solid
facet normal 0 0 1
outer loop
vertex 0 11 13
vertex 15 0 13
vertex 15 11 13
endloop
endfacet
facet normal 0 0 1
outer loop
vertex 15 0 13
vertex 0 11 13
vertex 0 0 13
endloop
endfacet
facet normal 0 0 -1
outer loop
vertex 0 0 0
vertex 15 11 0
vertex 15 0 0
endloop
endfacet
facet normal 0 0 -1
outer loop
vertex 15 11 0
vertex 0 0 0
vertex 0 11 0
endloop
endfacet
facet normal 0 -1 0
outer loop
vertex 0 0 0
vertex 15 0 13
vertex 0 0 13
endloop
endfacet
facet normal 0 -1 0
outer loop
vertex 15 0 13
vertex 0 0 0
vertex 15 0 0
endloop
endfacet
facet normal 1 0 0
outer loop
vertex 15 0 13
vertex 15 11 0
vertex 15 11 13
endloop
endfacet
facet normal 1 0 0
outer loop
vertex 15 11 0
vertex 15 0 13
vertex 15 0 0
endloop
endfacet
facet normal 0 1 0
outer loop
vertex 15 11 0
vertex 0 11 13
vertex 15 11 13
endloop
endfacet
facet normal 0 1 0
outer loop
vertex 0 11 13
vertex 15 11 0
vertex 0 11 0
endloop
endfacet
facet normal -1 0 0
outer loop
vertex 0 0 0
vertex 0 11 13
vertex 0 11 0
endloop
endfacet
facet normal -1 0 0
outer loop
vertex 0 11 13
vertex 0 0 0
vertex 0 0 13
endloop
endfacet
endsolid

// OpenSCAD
// Generated by SolidPython 1.0.1 on 2020-07-29 00:46:55


cube(size = [15, 11, 13]);
/***********************************************
*********      SolidPython code:      **********
************************************************
 
# import packages: SolidPython
from solid import *
from solid.utils import *
from itertools import chain, combinations, permutations


class Resize:

    def __init__(self, scad_file):
        self.scad_file = scad_file
        #self.scad_file = import_scad(scad_file)
        # cone/cylinder param:
        self.r1 = 0
        self.r2 = 0
        self.h = 0
        # rectangular prism param:
        self.w = 0
        self.l = 0
        # ellipse param:
        self.r = 0

    # import OpenScad code (file name corresponds to shape)


    # classify shape + parameters
    def assign(self, param1, param2, param3):
        if self.scad_file == 'cone.scad':
            self.r1 = param1
            self.r2 = param2
            self.h = param3
        elif self.scad_file == 'cylinder.scad':
            self.r1 = param1
            self.r2 = param2
            self.h = param3
        elif self.scad_file == 'rectangularPrism.scad':
            self.h = param1
            self.l = param2
            self.w = param3
        else:
            self.r = param1
            self.h = param2

    # resize parameters
    def iterate(self):
        x = range(3, 20, 2)
        i = 1
        if self.scad_file == 'cone.scad':
            tempList = list(permutations(x, 2))
            for temp in tempList:
                param1 = temp[0]
                param2 = temp[1]
                filepath = 'produced_scad_files/' + 'cone' + str(param1) + '_' + str(param2) + '_' + '.scad'
                scad_render_to_file(cylinder(h=param1, r1=param2, r2=0), filepath)

        elif self.scad_file == 'cylinder.scad':
            tempList = list(permutations(x, 3))
            for temp in tempList:
                param1 = temp[0]
                param2 = temp[1]
                filepath = 'produced_scad_files/' + 'cylinder' + str(param1) + '_' + str(param2) + '_' + '.scad'
                scad_render_to_file(cylinder(h=param1, r1=param2, r2=param2), filepath)

        elif self.scad_file == 'rectangularPrism.scad':
            tempList = list(permutations(x, 3))
            for temp in tempList:
                param1 = temp[0]
                param2 = temp[1]
                param3 = temp[2]
                filepath = 'produced_scad_files/' + 'rectangularPrism' + str(param1) + '_' + str(param2) + '_' + str(
                    param3) + '.scad'
                scad_render_to_file(cube(size=(param1, param2, param3)), filepath)

        elif self.scad_file == 'ellipse.scad':
            tempList = list(permutations(x, 4))
            for temp in tempList:
                param1 = temp[0]
                param2 = temp[1]
                param3 = temp[2]
                param4 = temp[3]
                filepath = 'produced_scad_files/' + 'ellipse' + str(param1) + '_' + str(param2) + '_' + str(param3) + '_' + str(param4) + '.scad'
                scad_render_to_file(scale([param1, param2, param3])(sphere(r=param4)), filepath)

    def render_to_scadfile(self):
        scad_render_to_file(scad, 'example.scad') 
 
************************************************/
